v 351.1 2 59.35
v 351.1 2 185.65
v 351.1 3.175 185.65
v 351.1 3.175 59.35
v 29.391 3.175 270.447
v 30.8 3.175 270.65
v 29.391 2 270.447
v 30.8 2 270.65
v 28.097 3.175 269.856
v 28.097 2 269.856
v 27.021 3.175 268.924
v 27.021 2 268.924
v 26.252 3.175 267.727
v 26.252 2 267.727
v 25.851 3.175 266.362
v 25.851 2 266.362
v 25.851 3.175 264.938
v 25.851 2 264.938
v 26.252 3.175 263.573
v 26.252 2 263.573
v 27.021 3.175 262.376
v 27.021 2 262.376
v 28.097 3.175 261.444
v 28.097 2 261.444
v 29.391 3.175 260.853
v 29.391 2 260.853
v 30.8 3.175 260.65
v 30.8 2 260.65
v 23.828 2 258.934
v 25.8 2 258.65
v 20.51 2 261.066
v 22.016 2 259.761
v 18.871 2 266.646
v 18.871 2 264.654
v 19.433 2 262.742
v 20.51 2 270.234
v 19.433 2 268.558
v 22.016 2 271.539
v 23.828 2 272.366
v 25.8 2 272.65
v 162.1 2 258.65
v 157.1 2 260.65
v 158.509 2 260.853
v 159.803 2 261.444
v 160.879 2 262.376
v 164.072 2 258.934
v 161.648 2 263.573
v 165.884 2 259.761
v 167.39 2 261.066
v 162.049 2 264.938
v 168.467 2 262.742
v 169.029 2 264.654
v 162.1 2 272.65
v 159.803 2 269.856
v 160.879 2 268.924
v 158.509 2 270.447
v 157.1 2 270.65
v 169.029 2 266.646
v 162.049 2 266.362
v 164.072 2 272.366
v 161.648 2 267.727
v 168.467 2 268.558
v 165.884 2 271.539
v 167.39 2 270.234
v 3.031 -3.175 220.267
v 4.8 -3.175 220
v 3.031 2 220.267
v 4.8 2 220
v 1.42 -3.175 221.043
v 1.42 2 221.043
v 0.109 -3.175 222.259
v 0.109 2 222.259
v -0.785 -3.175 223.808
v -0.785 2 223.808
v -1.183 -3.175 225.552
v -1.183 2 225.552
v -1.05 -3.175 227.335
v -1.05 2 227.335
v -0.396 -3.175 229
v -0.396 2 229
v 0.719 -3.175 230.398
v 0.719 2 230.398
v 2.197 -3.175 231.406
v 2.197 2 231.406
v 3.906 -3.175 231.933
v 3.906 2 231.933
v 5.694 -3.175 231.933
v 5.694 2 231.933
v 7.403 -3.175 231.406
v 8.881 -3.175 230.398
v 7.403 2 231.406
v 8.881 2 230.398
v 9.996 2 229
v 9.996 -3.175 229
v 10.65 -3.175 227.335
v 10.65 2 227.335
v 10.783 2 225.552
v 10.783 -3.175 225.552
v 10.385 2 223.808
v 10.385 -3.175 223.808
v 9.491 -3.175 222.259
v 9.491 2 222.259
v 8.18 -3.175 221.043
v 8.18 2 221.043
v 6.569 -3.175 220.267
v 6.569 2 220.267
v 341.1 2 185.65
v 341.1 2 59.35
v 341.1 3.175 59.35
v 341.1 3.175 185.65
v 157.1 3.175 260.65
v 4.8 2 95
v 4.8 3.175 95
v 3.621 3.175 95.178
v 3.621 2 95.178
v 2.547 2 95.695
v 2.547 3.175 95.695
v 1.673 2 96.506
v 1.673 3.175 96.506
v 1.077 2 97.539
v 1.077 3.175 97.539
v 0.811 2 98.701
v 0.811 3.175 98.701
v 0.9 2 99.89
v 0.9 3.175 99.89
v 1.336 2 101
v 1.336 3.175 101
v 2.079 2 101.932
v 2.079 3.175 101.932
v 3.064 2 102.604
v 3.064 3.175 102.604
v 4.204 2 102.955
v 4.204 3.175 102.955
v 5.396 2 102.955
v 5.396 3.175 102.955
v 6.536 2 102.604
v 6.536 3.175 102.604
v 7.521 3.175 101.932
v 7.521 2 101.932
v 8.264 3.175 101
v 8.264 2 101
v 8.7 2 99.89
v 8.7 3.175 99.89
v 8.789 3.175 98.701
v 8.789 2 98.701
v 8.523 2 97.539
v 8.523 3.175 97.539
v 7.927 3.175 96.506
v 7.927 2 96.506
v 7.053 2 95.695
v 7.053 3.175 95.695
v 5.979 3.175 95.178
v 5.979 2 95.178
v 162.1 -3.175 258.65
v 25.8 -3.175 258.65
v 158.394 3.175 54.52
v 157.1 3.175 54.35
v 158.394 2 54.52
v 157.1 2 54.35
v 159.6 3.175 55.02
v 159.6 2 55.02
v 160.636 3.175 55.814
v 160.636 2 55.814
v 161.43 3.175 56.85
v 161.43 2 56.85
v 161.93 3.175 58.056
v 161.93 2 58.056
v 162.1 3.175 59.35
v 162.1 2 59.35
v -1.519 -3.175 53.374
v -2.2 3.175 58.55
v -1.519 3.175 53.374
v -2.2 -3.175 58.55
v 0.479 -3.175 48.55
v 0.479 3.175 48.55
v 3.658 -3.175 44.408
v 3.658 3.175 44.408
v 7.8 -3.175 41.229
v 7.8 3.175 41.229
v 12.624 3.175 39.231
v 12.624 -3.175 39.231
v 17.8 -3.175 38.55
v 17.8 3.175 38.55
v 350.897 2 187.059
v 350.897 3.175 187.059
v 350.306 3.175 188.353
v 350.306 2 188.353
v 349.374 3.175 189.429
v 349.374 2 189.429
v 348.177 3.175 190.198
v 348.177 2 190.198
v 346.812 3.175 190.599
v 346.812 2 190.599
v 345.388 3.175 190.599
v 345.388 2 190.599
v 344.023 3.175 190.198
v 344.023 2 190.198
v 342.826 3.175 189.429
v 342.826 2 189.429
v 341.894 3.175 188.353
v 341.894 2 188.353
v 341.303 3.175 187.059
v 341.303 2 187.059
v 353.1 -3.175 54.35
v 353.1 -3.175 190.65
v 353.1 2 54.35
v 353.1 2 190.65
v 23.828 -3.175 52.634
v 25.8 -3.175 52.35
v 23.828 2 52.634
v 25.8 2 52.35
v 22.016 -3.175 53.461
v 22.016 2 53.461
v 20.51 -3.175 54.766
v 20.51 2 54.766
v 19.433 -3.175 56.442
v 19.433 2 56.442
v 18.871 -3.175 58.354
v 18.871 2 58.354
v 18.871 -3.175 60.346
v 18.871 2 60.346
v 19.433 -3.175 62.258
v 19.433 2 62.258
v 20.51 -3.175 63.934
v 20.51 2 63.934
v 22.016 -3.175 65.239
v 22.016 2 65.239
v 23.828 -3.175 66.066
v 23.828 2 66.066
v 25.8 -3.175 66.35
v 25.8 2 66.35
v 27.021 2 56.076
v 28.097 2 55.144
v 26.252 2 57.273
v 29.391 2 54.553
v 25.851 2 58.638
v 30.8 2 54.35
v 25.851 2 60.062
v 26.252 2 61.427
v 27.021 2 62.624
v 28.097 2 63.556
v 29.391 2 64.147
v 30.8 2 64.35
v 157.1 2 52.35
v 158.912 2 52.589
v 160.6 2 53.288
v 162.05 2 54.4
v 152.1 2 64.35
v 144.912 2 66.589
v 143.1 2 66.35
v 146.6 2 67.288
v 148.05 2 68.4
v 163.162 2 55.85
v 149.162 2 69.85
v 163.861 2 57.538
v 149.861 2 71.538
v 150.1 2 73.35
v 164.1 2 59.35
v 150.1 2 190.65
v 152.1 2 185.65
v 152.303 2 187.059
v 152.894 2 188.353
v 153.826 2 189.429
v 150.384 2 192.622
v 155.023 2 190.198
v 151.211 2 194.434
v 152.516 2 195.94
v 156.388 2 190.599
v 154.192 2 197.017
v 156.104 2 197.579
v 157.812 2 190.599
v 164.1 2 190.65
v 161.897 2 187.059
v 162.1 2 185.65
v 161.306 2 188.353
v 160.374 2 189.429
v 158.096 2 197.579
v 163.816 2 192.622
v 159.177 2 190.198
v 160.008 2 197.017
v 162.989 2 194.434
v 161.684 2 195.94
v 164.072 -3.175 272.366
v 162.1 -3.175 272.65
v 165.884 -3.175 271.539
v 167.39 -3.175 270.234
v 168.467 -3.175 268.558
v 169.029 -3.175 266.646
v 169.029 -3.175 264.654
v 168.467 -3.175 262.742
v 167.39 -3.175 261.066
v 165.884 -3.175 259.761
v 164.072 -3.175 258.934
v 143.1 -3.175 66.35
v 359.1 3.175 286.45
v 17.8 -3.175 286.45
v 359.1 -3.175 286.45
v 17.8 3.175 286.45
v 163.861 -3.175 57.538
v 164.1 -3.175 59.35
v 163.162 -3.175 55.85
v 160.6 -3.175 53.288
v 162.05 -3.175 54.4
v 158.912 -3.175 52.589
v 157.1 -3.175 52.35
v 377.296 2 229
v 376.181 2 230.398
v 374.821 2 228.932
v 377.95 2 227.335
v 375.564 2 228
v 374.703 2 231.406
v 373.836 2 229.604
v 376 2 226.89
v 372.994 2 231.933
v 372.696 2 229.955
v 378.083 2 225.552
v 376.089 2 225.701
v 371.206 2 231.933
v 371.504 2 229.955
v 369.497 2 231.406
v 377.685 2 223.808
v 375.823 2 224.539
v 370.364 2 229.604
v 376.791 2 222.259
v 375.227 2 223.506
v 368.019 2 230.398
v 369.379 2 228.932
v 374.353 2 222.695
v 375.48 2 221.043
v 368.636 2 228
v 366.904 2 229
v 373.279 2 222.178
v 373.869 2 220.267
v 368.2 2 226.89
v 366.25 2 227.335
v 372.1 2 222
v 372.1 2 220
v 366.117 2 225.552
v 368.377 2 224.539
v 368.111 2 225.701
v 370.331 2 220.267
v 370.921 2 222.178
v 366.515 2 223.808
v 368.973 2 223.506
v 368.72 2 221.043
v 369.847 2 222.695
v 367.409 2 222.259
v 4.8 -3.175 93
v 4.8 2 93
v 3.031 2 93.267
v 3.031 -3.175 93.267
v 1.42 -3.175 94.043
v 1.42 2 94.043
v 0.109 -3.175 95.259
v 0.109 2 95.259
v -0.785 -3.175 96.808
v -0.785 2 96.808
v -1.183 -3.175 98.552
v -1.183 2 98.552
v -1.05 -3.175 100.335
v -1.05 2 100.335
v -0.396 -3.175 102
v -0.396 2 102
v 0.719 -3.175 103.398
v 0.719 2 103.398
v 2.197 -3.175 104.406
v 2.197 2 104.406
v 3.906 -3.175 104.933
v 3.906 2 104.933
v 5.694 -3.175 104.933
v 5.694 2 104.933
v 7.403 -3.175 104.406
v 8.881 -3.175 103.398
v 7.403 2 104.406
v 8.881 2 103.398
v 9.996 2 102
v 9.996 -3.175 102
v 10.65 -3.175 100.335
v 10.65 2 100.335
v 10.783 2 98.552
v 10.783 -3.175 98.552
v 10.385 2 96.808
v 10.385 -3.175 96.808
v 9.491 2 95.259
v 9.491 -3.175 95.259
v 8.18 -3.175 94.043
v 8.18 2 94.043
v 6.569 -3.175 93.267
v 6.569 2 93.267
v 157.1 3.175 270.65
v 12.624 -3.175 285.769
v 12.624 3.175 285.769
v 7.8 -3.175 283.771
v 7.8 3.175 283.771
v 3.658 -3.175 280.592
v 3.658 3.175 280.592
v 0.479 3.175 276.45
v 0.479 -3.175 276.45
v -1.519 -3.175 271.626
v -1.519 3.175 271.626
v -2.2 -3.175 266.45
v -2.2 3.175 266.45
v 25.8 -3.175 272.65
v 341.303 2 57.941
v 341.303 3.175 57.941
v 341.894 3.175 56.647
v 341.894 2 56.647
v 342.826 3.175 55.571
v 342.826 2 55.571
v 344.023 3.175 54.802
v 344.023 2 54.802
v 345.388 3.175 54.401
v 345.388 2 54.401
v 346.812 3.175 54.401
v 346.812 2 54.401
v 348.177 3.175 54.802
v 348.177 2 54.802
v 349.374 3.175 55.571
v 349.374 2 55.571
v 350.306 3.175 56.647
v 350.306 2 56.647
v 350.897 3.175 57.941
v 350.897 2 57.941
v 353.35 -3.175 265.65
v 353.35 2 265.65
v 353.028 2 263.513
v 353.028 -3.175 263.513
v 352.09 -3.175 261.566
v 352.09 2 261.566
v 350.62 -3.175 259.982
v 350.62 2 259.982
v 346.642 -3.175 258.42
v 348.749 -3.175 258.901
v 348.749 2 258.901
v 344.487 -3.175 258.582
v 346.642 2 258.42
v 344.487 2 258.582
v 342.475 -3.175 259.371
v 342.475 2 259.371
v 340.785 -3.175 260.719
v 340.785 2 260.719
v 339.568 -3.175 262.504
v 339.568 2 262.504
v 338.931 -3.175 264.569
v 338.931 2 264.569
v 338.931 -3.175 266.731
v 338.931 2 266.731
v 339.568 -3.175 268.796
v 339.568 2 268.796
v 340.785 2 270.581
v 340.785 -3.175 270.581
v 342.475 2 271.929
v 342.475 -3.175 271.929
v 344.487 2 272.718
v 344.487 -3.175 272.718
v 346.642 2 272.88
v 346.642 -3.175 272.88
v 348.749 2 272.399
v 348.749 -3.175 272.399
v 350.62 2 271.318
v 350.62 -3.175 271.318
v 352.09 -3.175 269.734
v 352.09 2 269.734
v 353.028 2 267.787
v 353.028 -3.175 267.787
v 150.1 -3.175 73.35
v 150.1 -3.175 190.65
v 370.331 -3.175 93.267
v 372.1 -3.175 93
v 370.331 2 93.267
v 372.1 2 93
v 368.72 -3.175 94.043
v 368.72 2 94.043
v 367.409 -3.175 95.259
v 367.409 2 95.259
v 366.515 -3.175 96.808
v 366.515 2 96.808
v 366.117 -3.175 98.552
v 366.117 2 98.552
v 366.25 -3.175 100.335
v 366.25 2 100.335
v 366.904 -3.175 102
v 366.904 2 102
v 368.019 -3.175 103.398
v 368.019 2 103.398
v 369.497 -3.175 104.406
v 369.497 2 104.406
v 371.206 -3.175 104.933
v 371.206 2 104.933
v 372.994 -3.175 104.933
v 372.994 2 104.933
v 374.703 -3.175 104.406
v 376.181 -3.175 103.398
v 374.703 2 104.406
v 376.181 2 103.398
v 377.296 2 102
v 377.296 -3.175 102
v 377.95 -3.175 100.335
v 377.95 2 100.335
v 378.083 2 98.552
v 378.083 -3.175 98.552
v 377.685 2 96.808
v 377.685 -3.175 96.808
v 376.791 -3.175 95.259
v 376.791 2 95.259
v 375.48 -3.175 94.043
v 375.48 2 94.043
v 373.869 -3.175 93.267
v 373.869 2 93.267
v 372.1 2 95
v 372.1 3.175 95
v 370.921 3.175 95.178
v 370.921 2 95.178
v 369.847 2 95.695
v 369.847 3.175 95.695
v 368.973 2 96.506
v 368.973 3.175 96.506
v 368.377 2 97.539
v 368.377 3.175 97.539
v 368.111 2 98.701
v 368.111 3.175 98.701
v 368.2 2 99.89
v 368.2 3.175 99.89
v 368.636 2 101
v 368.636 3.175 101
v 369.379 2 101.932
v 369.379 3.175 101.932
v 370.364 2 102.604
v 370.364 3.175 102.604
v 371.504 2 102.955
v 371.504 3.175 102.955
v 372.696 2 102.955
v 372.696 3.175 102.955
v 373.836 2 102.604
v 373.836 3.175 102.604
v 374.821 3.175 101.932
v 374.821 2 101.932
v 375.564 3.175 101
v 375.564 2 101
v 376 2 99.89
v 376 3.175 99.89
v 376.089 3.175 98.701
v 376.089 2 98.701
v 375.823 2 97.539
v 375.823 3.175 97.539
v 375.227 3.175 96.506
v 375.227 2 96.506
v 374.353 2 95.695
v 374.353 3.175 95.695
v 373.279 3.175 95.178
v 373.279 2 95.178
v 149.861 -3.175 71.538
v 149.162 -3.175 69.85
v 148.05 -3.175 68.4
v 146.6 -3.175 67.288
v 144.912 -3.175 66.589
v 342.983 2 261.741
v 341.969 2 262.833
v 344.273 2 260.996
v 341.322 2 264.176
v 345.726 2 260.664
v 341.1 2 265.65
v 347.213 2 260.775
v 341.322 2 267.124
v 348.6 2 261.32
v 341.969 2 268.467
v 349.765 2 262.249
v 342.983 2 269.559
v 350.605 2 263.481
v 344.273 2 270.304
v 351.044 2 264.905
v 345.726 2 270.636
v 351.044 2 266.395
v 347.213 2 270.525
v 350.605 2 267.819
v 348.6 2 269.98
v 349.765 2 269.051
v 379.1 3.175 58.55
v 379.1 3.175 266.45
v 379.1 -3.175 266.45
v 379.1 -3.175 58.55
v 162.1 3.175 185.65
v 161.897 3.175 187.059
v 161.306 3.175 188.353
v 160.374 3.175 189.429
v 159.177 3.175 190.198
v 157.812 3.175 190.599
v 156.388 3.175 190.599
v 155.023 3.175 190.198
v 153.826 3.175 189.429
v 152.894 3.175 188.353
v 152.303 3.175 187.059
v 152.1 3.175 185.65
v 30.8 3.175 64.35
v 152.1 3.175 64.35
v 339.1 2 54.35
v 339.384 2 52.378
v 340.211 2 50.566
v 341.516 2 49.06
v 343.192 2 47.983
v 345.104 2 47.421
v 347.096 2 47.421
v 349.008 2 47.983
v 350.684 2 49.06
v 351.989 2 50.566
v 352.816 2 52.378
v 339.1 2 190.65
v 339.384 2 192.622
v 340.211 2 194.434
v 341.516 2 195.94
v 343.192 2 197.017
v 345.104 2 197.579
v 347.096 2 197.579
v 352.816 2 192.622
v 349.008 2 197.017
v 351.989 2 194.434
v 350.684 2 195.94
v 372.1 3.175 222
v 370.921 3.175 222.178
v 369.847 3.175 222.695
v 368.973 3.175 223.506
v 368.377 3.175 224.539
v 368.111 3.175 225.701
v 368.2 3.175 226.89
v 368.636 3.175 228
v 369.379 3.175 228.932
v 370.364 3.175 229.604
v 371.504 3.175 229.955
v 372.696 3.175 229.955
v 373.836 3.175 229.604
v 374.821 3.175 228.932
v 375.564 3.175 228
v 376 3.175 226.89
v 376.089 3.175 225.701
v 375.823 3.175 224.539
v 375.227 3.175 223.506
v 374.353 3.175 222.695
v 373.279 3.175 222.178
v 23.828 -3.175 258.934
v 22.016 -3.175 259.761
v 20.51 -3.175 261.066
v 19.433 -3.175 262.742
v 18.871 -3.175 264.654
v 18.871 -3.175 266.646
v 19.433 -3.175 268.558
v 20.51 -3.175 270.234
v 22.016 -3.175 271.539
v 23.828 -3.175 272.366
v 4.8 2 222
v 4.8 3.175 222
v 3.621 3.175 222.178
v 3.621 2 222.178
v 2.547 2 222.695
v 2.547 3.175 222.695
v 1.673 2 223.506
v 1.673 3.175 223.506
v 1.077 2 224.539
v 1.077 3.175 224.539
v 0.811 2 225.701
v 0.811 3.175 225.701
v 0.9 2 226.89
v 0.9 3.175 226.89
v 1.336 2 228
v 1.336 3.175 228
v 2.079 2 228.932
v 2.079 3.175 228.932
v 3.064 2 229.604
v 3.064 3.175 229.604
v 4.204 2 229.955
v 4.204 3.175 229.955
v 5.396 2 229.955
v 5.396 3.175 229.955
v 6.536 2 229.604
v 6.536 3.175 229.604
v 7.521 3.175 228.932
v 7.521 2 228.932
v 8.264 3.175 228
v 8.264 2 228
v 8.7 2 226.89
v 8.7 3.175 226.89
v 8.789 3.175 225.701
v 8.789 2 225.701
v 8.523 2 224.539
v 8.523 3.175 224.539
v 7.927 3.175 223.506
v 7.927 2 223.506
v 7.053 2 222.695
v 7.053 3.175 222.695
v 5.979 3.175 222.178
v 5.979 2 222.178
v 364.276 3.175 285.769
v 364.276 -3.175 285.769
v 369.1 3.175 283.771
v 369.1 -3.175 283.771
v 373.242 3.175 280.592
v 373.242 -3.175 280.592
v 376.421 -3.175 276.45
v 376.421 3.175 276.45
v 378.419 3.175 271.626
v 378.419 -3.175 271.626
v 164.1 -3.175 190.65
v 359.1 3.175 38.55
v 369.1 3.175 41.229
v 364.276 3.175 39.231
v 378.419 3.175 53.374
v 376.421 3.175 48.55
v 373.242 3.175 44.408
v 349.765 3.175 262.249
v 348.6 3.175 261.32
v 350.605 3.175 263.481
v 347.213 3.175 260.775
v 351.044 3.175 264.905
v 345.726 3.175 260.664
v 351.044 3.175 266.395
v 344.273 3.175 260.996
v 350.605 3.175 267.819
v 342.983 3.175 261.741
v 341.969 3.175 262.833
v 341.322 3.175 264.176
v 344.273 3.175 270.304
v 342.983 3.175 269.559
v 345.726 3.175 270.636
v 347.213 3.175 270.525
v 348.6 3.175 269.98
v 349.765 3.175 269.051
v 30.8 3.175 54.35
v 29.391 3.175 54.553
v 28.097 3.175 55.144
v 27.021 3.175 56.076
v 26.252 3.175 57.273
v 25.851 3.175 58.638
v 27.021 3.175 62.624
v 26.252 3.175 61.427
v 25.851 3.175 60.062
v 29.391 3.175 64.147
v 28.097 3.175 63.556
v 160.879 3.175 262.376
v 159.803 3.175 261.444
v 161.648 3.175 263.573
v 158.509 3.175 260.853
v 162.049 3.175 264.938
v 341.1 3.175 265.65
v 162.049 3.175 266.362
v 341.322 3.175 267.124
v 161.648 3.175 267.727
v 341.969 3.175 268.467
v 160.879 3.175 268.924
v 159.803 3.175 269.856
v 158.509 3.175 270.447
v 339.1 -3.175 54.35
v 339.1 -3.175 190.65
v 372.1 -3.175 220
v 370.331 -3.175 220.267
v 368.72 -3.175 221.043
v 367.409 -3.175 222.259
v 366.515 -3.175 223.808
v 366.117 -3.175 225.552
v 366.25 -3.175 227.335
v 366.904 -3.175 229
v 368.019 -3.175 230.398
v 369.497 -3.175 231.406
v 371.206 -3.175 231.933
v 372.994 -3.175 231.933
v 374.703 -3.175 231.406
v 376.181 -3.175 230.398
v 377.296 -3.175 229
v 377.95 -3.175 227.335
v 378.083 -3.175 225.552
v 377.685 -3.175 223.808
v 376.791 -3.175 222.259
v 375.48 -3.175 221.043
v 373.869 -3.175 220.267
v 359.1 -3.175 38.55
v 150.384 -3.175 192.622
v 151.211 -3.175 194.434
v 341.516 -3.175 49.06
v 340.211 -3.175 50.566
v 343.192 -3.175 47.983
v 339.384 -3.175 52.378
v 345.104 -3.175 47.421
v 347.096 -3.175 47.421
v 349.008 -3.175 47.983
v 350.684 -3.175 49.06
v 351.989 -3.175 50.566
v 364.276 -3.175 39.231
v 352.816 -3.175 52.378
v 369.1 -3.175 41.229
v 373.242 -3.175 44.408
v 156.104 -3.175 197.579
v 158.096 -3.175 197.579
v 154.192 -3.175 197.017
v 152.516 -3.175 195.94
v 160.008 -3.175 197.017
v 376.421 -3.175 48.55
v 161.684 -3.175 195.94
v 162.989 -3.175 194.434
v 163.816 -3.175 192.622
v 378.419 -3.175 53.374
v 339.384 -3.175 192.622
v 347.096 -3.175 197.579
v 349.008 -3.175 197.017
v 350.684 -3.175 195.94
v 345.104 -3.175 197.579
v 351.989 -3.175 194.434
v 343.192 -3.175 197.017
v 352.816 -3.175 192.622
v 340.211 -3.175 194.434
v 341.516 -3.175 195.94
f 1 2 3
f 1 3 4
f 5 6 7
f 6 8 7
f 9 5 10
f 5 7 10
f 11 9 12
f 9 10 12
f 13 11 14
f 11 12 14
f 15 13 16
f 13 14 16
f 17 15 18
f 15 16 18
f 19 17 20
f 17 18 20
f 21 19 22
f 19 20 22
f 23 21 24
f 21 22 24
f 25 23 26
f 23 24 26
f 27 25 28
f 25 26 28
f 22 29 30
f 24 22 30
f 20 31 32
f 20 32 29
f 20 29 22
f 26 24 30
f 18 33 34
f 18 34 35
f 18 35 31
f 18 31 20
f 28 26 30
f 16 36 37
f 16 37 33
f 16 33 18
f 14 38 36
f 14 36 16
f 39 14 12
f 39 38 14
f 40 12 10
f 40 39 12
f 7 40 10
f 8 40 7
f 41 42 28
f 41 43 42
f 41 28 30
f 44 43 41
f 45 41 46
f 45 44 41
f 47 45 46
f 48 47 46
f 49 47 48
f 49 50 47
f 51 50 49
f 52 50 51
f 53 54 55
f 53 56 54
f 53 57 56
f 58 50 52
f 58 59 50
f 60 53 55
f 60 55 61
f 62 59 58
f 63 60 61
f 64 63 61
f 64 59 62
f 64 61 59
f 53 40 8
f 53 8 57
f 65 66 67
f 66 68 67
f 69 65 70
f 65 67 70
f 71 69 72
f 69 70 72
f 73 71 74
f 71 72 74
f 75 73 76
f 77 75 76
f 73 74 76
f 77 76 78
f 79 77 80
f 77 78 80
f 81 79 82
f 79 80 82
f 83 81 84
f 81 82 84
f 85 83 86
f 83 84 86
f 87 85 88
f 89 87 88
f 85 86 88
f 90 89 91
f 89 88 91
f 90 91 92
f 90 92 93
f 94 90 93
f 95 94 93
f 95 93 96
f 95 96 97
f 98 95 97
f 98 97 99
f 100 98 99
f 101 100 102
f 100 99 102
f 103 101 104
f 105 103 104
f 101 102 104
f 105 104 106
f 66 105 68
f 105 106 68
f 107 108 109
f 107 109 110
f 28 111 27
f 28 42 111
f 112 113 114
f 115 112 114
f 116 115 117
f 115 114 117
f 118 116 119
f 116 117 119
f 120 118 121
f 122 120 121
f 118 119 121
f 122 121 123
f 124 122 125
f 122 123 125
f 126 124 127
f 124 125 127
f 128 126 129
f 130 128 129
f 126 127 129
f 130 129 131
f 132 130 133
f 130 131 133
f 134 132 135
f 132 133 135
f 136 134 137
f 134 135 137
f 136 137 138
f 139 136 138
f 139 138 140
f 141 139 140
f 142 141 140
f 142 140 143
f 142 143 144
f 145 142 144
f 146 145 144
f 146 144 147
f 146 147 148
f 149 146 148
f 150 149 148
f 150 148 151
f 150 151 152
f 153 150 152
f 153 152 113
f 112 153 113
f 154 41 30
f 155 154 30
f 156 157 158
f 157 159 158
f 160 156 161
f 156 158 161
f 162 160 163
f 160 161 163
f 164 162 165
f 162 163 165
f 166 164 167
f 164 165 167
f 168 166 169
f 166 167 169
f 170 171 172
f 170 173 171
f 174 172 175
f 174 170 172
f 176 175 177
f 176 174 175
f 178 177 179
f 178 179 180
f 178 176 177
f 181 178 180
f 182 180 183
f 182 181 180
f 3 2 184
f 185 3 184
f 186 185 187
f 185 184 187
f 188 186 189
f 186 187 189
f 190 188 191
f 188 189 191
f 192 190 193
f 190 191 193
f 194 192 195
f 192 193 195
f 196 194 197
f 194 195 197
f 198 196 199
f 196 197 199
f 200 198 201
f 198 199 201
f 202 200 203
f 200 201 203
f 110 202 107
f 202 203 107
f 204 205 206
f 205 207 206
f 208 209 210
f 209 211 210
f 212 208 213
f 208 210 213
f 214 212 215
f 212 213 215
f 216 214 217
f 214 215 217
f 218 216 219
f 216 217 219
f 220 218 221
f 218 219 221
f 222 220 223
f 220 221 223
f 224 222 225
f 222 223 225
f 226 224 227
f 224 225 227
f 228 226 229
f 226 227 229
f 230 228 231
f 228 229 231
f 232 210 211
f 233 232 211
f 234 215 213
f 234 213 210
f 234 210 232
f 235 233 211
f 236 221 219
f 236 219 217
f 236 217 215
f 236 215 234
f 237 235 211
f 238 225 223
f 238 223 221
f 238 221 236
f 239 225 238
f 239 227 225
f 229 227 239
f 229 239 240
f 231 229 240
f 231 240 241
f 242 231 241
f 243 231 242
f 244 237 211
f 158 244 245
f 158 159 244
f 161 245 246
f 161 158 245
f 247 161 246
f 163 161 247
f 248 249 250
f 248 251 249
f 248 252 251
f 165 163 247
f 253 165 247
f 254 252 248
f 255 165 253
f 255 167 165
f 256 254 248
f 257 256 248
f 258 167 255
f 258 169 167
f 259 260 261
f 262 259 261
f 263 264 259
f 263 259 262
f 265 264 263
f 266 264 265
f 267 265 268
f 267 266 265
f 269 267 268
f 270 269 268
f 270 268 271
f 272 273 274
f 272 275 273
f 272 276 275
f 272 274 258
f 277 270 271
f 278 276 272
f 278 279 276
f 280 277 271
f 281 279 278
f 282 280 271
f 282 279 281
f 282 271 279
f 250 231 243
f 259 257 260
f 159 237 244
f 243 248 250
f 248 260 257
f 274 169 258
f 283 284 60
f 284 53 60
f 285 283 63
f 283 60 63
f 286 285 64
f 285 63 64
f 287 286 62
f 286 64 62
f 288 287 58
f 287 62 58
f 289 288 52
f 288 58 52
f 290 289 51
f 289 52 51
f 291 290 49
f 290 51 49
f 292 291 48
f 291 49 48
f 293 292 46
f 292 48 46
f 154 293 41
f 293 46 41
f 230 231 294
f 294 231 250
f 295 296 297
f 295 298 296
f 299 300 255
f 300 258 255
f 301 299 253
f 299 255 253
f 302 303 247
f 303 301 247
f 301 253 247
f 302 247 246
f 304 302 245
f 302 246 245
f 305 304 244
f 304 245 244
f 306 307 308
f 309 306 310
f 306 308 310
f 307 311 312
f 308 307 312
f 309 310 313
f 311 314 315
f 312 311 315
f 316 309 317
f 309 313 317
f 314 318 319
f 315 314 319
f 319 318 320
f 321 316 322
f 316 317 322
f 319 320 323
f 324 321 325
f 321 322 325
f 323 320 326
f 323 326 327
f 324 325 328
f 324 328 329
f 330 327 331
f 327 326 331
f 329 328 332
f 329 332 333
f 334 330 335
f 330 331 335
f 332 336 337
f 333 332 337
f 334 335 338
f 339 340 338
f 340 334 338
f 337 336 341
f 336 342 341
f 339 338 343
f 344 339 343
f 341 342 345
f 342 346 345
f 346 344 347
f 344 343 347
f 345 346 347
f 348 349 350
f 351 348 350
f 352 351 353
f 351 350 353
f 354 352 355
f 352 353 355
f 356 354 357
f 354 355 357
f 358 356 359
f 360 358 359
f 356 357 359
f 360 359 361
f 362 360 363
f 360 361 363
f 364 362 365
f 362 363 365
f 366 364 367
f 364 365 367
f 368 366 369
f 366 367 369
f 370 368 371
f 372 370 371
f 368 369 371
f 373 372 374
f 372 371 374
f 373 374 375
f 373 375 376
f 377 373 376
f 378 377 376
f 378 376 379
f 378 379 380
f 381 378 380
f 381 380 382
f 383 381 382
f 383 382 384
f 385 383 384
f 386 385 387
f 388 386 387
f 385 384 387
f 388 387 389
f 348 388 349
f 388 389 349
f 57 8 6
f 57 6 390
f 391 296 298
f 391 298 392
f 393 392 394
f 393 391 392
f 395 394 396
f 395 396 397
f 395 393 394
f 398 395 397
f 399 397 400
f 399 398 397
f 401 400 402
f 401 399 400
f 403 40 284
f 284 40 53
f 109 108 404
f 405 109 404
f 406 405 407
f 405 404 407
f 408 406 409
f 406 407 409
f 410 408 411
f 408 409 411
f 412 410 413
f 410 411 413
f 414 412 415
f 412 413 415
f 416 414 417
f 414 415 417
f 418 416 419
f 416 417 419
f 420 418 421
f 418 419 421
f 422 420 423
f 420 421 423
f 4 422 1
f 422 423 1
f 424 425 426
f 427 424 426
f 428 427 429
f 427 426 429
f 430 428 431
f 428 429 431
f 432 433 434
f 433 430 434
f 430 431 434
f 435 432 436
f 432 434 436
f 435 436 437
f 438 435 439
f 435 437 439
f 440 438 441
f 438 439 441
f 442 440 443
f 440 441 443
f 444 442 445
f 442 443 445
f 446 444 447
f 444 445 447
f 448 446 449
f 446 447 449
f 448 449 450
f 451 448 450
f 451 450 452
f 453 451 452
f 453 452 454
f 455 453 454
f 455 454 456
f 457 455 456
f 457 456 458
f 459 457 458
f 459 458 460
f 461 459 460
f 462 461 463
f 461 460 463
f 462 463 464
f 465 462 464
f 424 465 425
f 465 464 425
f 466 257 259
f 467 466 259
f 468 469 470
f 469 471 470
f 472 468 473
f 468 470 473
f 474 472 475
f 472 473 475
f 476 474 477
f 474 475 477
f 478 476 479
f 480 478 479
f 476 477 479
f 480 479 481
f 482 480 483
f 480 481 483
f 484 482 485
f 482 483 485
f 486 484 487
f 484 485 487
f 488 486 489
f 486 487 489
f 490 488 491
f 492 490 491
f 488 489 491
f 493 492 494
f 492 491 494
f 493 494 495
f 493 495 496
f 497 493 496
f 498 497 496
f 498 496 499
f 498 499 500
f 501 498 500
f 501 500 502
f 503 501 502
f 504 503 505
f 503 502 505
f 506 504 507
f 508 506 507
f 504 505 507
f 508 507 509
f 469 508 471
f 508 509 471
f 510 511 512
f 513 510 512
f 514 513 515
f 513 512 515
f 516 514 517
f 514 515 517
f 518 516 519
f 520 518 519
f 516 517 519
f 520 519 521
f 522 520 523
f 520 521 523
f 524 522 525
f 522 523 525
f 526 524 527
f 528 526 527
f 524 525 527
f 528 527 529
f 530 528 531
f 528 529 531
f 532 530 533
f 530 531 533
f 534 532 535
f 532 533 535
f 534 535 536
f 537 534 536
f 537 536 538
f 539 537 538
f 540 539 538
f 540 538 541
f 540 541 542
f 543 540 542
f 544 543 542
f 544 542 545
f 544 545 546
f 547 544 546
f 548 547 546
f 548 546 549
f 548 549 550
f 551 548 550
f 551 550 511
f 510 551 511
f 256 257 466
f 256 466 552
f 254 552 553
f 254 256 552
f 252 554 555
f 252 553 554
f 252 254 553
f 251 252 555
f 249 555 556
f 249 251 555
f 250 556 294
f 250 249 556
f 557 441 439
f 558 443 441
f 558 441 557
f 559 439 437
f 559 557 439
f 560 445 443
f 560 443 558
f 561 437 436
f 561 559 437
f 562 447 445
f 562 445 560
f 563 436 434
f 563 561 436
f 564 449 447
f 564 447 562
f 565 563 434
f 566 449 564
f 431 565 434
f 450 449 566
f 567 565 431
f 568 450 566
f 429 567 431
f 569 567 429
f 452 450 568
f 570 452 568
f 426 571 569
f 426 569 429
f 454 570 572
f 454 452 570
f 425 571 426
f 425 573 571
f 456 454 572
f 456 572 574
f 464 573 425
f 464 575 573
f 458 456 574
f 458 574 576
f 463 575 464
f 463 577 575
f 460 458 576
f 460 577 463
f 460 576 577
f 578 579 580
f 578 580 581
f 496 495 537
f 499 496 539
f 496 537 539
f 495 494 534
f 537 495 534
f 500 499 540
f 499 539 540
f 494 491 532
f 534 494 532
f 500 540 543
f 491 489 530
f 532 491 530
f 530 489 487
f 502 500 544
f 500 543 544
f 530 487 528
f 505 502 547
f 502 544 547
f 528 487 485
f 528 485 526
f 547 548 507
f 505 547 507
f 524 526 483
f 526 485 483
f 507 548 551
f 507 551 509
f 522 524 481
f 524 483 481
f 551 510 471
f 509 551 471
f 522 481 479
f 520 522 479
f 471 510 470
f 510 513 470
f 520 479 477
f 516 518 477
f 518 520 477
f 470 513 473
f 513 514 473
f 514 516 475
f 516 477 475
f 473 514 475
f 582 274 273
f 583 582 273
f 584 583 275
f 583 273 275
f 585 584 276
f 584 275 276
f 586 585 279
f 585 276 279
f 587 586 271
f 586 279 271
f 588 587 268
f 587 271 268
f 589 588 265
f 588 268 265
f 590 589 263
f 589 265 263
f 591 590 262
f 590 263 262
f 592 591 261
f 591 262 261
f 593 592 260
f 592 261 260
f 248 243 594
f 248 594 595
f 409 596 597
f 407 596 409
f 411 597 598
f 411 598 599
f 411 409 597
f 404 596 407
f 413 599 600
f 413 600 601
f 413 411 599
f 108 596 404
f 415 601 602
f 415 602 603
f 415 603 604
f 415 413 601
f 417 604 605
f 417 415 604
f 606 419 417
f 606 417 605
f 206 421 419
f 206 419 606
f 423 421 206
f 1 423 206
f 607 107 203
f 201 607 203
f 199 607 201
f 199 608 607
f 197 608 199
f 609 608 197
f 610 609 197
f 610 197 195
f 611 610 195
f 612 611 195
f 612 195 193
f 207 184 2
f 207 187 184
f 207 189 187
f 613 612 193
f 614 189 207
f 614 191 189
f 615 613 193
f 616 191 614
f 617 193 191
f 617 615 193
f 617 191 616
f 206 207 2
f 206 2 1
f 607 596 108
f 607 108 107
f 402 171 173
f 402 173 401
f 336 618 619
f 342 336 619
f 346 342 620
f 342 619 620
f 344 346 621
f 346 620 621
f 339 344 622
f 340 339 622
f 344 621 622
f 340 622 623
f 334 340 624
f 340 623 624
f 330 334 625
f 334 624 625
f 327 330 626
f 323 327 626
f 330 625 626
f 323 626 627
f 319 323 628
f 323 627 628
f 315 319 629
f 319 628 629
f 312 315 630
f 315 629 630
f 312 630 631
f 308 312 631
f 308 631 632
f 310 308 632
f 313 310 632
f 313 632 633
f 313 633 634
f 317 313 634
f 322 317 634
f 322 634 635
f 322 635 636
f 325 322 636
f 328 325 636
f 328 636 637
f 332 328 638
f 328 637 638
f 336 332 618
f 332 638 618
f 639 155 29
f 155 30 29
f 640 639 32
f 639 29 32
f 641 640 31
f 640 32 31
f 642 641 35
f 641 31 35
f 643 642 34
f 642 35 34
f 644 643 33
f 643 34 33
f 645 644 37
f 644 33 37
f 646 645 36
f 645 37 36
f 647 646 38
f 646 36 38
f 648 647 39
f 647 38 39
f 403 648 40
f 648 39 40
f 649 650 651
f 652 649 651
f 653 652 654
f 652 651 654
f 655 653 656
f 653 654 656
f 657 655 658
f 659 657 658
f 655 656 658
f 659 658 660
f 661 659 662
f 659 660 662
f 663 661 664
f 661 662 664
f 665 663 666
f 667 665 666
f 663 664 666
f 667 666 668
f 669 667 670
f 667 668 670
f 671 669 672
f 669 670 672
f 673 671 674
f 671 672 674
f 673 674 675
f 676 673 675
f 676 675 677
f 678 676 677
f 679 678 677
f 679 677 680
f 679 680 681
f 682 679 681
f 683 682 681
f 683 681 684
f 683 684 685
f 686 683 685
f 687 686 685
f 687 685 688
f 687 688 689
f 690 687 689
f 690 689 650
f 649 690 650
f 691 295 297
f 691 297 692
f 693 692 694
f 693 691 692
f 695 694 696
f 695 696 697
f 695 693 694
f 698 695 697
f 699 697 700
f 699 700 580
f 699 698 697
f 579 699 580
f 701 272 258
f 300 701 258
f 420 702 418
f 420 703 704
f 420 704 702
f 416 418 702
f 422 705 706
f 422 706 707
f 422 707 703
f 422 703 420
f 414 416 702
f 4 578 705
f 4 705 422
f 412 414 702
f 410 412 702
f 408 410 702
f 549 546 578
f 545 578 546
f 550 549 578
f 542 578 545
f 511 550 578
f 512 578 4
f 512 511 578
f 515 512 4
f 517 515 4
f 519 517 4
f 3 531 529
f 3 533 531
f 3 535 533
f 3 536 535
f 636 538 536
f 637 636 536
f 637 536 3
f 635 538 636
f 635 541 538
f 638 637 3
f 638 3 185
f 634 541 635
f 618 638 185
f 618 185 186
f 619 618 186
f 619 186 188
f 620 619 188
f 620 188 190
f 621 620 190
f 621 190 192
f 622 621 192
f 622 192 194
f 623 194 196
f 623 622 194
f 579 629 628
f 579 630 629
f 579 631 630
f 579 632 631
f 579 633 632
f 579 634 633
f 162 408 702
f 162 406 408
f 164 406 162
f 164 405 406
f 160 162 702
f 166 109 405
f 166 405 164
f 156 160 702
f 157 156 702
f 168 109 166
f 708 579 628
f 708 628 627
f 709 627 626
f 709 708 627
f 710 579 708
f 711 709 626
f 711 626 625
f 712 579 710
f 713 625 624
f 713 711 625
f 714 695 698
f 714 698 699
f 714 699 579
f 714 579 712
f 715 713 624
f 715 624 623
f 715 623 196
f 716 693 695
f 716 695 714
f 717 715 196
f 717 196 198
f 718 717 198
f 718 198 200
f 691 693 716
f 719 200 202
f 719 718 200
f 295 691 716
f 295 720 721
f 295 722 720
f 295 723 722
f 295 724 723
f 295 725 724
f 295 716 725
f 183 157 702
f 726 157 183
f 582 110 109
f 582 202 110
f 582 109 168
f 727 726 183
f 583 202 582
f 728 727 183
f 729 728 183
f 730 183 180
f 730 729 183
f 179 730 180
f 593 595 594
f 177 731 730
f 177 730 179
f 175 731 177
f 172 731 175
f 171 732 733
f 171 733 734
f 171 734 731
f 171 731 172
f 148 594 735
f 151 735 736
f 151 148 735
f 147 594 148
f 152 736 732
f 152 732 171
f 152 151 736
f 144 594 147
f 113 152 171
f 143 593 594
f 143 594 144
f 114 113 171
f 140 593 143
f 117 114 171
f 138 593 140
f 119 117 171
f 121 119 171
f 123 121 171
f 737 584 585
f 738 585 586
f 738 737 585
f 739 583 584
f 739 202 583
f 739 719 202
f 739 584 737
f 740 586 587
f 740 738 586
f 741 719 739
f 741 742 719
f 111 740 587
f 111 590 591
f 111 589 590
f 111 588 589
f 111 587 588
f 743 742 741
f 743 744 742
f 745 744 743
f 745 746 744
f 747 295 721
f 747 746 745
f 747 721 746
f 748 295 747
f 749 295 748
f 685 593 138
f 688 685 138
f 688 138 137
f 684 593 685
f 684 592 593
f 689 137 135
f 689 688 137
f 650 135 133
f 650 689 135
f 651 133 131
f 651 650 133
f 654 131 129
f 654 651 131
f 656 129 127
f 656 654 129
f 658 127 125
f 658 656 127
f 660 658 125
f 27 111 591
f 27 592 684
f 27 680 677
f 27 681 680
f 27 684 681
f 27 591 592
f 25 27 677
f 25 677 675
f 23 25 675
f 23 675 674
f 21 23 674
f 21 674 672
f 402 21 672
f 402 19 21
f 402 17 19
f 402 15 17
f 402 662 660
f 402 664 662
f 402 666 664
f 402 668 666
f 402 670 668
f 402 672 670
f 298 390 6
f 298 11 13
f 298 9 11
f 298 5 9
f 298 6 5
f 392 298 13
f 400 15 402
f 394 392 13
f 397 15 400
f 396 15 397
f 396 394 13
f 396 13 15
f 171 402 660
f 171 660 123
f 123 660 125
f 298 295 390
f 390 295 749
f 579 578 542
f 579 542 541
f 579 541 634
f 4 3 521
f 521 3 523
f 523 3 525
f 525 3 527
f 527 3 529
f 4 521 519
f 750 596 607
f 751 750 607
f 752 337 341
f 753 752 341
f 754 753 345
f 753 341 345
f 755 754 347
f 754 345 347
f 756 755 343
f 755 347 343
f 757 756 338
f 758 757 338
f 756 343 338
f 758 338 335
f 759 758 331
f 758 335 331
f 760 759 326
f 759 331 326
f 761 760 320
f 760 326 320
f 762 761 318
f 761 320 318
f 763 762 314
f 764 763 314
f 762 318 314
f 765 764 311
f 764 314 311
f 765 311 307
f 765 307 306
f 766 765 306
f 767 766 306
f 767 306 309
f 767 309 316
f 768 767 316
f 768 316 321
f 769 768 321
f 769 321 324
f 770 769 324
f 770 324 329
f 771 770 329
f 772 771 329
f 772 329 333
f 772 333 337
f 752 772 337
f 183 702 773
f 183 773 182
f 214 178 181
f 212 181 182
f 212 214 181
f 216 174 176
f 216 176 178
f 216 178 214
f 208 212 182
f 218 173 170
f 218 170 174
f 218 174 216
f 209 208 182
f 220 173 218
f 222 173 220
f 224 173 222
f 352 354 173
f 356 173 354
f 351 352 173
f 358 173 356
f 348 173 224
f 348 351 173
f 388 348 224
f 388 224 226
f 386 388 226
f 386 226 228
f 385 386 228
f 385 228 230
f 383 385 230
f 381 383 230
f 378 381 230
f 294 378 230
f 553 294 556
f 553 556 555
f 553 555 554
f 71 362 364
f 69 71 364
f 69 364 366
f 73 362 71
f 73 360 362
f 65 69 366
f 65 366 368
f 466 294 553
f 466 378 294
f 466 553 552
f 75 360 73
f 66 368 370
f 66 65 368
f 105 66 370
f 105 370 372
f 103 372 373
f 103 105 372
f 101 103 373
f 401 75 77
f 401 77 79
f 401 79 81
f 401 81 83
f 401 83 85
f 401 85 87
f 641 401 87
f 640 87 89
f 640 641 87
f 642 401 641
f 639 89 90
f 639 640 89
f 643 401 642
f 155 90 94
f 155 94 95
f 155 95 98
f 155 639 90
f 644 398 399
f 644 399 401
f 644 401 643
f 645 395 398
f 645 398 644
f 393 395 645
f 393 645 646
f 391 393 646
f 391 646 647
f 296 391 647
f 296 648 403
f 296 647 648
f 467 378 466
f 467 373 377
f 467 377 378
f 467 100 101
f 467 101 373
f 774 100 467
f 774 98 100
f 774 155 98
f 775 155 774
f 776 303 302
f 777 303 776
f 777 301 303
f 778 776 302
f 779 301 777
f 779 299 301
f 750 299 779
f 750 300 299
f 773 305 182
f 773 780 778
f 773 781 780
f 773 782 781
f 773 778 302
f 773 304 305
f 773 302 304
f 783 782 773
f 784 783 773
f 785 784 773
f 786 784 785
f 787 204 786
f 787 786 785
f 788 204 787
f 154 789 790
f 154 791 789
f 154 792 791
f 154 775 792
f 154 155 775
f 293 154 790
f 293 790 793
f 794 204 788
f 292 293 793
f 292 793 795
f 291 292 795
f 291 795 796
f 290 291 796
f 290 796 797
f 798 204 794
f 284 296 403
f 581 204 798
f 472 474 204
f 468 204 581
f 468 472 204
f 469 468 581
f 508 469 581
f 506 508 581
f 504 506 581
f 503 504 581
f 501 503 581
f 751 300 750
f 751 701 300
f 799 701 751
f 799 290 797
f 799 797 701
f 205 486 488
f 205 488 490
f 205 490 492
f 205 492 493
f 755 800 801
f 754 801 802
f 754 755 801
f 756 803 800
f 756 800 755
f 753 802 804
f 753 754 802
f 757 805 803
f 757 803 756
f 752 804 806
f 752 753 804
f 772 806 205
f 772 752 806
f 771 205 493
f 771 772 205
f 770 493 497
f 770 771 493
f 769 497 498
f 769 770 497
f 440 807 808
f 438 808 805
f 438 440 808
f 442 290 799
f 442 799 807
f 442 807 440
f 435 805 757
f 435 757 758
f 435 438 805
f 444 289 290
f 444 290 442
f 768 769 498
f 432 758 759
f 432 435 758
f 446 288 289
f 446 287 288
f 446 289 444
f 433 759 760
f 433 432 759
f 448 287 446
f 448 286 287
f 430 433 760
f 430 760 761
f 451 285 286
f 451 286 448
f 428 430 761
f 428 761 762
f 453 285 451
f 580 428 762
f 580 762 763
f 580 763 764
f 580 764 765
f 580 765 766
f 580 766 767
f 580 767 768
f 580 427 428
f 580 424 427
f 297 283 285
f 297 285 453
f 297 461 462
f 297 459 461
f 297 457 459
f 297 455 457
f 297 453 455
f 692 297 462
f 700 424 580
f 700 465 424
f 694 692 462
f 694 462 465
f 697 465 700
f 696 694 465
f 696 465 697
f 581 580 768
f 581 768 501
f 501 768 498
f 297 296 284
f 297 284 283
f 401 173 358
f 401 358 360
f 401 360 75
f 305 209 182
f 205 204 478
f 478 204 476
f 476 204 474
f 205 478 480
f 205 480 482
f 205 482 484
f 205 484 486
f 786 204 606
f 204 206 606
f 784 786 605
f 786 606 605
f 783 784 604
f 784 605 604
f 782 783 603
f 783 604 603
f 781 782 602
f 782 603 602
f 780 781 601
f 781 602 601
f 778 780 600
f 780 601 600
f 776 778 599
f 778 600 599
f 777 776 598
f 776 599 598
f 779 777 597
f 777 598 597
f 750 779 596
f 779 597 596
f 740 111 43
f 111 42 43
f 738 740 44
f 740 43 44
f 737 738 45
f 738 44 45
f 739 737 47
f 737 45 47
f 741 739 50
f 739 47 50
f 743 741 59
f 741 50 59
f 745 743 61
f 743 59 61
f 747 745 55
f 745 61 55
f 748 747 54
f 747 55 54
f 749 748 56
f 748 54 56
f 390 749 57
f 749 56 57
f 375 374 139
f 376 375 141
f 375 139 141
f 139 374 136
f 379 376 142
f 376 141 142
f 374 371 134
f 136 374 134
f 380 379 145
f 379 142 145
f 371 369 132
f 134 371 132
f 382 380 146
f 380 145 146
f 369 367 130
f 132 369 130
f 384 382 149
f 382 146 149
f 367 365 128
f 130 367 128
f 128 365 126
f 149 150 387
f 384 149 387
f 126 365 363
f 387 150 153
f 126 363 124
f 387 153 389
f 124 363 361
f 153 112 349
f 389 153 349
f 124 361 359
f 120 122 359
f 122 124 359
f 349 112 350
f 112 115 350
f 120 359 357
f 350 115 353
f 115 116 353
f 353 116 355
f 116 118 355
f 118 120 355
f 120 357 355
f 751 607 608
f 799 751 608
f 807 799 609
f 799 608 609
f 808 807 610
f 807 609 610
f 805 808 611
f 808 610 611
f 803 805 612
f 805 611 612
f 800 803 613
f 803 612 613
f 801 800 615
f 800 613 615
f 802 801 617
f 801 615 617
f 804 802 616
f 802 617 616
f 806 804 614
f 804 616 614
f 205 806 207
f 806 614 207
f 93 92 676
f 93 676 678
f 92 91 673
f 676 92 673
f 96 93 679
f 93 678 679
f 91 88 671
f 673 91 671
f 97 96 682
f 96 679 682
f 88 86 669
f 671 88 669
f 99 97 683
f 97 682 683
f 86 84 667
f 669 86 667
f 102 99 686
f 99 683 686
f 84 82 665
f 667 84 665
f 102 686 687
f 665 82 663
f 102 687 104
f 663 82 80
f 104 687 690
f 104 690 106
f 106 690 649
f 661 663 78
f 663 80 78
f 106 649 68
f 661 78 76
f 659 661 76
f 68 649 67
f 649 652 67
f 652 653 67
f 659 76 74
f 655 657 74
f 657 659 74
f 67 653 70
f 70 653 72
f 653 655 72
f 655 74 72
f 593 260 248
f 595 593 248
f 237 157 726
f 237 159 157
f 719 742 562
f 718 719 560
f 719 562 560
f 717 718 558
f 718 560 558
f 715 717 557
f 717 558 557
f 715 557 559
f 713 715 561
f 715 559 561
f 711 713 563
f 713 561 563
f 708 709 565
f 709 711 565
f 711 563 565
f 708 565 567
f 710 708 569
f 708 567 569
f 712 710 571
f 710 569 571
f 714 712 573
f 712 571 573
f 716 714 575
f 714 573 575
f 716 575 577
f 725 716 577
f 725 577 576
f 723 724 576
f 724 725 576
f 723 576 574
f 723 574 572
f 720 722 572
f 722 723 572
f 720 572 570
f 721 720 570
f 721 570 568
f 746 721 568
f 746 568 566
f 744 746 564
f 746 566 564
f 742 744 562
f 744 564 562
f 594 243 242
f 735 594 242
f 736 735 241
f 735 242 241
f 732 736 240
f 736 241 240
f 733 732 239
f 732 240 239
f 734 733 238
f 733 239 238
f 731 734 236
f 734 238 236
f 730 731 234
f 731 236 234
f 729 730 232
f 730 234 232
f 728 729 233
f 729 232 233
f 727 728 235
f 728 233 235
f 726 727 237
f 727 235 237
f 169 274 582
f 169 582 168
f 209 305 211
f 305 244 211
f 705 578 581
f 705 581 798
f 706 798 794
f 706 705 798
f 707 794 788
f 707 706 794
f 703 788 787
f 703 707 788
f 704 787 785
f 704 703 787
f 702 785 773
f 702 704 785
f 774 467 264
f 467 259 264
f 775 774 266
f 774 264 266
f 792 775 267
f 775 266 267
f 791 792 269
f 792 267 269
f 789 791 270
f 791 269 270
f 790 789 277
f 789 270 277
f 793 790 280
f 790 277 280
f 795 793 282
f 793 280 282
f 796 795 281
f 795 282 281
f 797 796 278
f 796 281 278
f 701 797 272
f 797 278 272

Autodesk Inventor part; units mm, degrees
ref_plane "YZ Plane" through (0, 0, 0) normal (1, 0, 0) x (0, 1, 0)
ref_plane "XZ Plane" through (0, 0, 0) normal (0, 1, 0) x (-1, 0, 0)
sketch "Sketch1" plane through (0, 0, 0) normal (0, 1, 0) x (-1, 0, 0)
  line L0 (-301.6, 175.65) -> (-203.3004, 175.65)
  line L1 (-203.3004, 275.65) -> (-301.6, 275.65)
  line L2 (-301.6, 275.65) -> (-301.6, 175.65)
  line L3 (-301.6, 275.65) -> (-201.6, 275.65)
  line L4 (-201.6, 275.65) -> (-201.6, 175.65)
  line L5 (-201.6, 175.65) -> (-301.6, 175.65)
  line L6 (-301.6, 175.65) -> (-301.6, 275.65)
  line L7 (-301.6, 175.65) -> (-301.6, 275.65)
  line L8 (-301.6, 275.65) -> (-201.6, 275.65)
  line L9 (-201.6, 275.65) -> (-201.6, 75.65)
  line L10 (-301.6, 75.65) -> (-301.6, 275.65)
  line L11 (-301.6, 75.65) -> (-301.6, 275.65)
  line L12 (-152.1, 75.65) -> (-162.1, 75.65)
  line L13 (-157.1, 260.65) -> (-57.1, 260.65)
  line L14 (-52.1, 265.65) -> (-52.1, 265.65)
  line L15 (-57.1, 270.65) -> (-157.1, 270.65)
  circle A0 centre (-346.1, 265.65) radius 5
  arc A1 (-157.1, 270.65) -> (-157.1, 260.65) centre (-157.1, 265.65) ccw
  line L16 (-201.6, 75.65) -> (-157.1, 75.65)
  arc A2 (-152.1, 185.65) -> (-162.1, 185.65) centre (-157.1, 185.65) ccw
  line L17 (-162.1, 185.65) -> (-162.1, 85.65)
  line L18 (-152.1, 75.65) -> (-152.1, 185.65)
  line L19 (-157.1, 80.65) -> (-157.1, 80.65)
  arc A3 (-341.1, 185.65) -> (-351.1, 185.65) centre (-346.1, 185.65) ccw
  line L20 (-341.1, 85.65) -> (-341.1, 185.65)
  line L21 (-351.1, 185.65) -> (-351.1, 85.65)
  line L22 (-346.1, 80.65) -> (-346.1, 80.65)
  line L23 (-301.6, 275.65) -> (-201.6, 275.65)
  line L24 (-201.6, 275.65) -> (-201.6, 49.35)
  line L25 (-201.6, 49.35) -> (-301.6, 49.35)
  line L26 (-301.6, 49.35) -> (-301.6, 275.65)
  line L27 (-351.1, 85.65) -> (-351.1, 59.35)
  line L28 (-341.1, 59.35) -> (-341.1, 85.65)
  arc A4 (-351.1, 59.35) -> (-341.1, 59.35) centre (-346.1, 59.35) ccw
  line L29 (-152.1, 80.65) -> (-152.1, 64.35)
  line L30 (-162.1, 59.35) -> (-162.1, 85.65)
  arc A5 (-162.1, 59.35) -> (-157.1, 54.35) centre (-157.1, 59.35) ccw
  line L31 (-301.6, 49.35) -> (-75.3, 49.35)
  line L32 (-75.3, 49.35) -> (-75.3, 275.65)
  line L33 (-75.3, 275.65) -> (-201.6, 275.65)
  line L34 (-157.1, 54.35) -> (-30.8, 54.35)
  arc A6 (-30.8, 54.35) -> (-30.8, 64.35) centre (-30.8, 59.35) ccw
  line L35 (-30.8, 64.35) -> (-152.1, 64.35)
  line L36 (-57.1, 260.65) -> (-30.8, 260.65)
  line L37 (-57.1, 270.65) -> (-30.8, 270.65)
  arc A7 (-30.8, 260.65) -> (-30.8, 270.65) centre (-30.8, 265.65) ccw
  line L38 (-69.2464, 270.65) -> (-69.2464, 286.45)
  line L39 (2.2, 286.45) -> (-379.1, 286.45)
  line L40 (-52.1, 54.35) -> (-52.1, 38.55)
  line L41 (2.2, 38.55) -> (-379.1, 38.55)
  line L42 (-25.8, 59.35) -> (-4.8, 59.35)
  line L43 (2.2, 38.55) -> (2.2, 286.45)
  line L44 (-4.8, 99) -> (-4.8, 226)
  line L45 (-372.1, 99) -> (-372.1, 226)
  line L46 (-379.1, 38.55) -> (-379.1, 286.45)
  point P0 (-52.1, 270.65)
  point P1 (-52.1, 260.65)
  point P2 (-157.1, 85.65)
  point P3 (-157.1, 185.65)
  point P4 (-157.1, 85.65)
  point P5 (-162.1, 80.65)
  point P6 (0, 305)
  point P7 (-152.1, 75.65)
  dimension "d2" = 100
  dimension "d3" = 100
  dimension "d7" = 10
  dimension "d8" = 10
  dimension "d16" = 10
  dimension "d17" = 44.5
  dimension "d20" = 10
  dimension "d21" = 10
  dimension "d22" = 10
  dimension "d70" = 226.3
  dimension "d72" = 10
  dimension "d73" = 10
  dimension "d180" = 226.3
  dimension "d224" = 15.8
  dimension "d227" = 15.8
  dimension "d229" = 21
  dimension "d233" = 127
  dimension "d235" = 127
extrude "Extrusion1" add sketch "Sketch1" along normal blind 3.175 contours L2 L1 L3 L4 L5 L0 | L10 L26 L25 L31 L32 L34 L40 L41 L46 L39 L38 L15 L33 L3 L1 L2 | L0 L5 L9 L24 L25 L26 L10 | L4 L33 L32 L15 A1 L13 L35 L29 L18 A2 L17 L30 L16 L9 | L16 L30 A5 L34 L32 L31 L24 | L38 L39 L43 L41 L40 L34 A6 L35 L32 L13 L36 A7 L37 L15
sketch "Sketch2" plane through (0, 0, 0) normal (0, -1, 0) x (1, 0, 0)
  line L0 (346.1, 80.65) -> (346.1, 80.65)
  line L1 (353.1, 85.65) -> (353.1, 190.65)
  line L2 (339.1, 190.65) -> (339.1, 85.65)
  line L3 (339.1, 85.65) -> (339.1, 54.35)
  line L4 (353.1, 54.35) -> (353.1, 85.65)
  circle A0 centre (346.1, 265.65) radius 7.25
  line L5 (57.1, 258.65) -> (162.1, 258.65)
  line L6 (162.1, 272.65) -> (57.1, 272.65)
  line L7 (57.1, 272.65) -> (25.8, 272.65)
  line L8 (25.8, 258.65) -> (57.1, 258.65)
  line L9 (25.8, 59.35) -> (25.8, 59.35)
  line L10 (157.1, 190.65) -> (157.1, 190.65)
  line L11 (152.1, 185.65) -> (152.1, 64.35) projected
  line L12 (25.8, 52.35) -> (157.1, 52.35)
  arc A1 (157.1, 52.35) -> (164.1, 59.35) centre (157.1, 59.35) ccw
  line L13 (164.1, 59.35) -> (164.1, 190.65)
  line L14 (150.1, 190.65) -> (150.1, 73.35)
  line L15 (143.1, 66.35) -> (25.8, 66.35)
  arc A2 (143.1, 66.35) -> (150.1, 73.35) centre (143.1, 73.35) ccw
  line L16 (346.1, 185.65) -> (346.1, 190.65)
  arc A3 (353.1, 190.65) -> (339.1, 190.65) centre (346.1, 190.65) ccw
  arc A4 (339.1, 54.35) -> (353.1, 54.35) centre (346.1, 54.35) ccw
  arc A5 (164.1, 190.65) -> (150.1, 190.65) centre (157.1, 190.65) ccw
  arc A6 (25.8, 66.35) -> (25.8, 52.35) centre (25.8, 59.35) ccw
  arc A7 (30.8, 270.65) -> (30.8, 260.65) centre (30.8, 265.65) ccw projected
  arc A8 (25.8, 272.65) -> (25.8, 258.65) centre (25.8, 265.65) ccw
  arc A9 (162.1, 258.65) -> (162.1, 272.65) centre (162.1, 265.65) ccw
  point P0 (0, 305)
  point P1 (52.1, 260.65)
  dimension "d209" = 7
  dimension "d212" = 5
  dimension "d213" = 14
  dimension "d215" = 14
  dimension "d217" = 14
  dimension "d219" = 14
  dimension "d221" = 14
  dimension "d223" = 14
extrude "Extrusion2" cut sketch "Sketch2" against normal blind 2
sketch "Sketch4" plane through (0, 0, 0) normal (0, -1, 0) x (1, 0, 0)
  line L0 (339.1, 54.35) -> (339.1, 190.65) projected
  line L1 (353.1, 190.65) -> (353.1, 54.35) projected
  line L2 (150.1, 73.35) -> (150.1, 190.65) projected
  line L3 (164.1, 190.65) -> (164.1, 59.35) projected
  arc A0 (157.1, 52.35) -> (164.1, 59.35) centre (157.1, 59.35) ccw projected
  line L4 (157.1, 52.35) -> (25.8, 52.35) projected
  arc A1 (143.1, 66.35) -> (150.1, 73.35) centre (143.1, 73.35) ccw projected
  line L5 (25.8, 66.35) -> (143.1, 66.35) projected
  circle A2 centre (346.1, 265.65) radius 7.25 projected
  line L6 (162.1, 258.65) -> (25.8, 258.65) projected
  line L7 (25.8, 272.65) -> (162.1, 272.65) projected
  arc A3 (339.1, 54.35) -> (353.1, 54.35) centre (346.1, 54.35) ccw projected
  arc A4 (353.1, 190.65) -> (339.1, 190.65) centre (346.1, 190.65) ccw projected
  arc A5 (164.1, 190.65) -> (150.1, 190.65) centre (157.1, 190.65) ccw projected
  arc A6 (25.8, 66.35) -> (25.8, 52.35) centre (25.8, 59.35) ccw projected
  arc A7 (162.1, 258.65) -> (162.1, 272.65) centre (162.1, 265.65) ccw projected
  arc A8 (25.8, 272.65) -> (25.8, 258.65) centre (25.8, 265.65) ccw projected
  line L8 (-2.2, 286.45) -> (379.1, 286.45) projected
  line L9 (379.1, 38.55) -> (-2.2, 38.55) projected
  line L10 (-2.2, 38.55) -> (-2.2, 286.45) projected
  line L11 (379.1, 286.45) -> (379.1, 38.55) projected
  point P0 (353.1, 59.35)
  point P1 (339.1, 59.35)
  point P2 (339.1, 185.65)
  point P3 (353.1, 185.65)
  point P4 (150.1, 185.65)
  point P5 (164.1, 185.65)
  point P6 (30.8, 52.35)
  point P7 (30.8, 66.35)
  point P8 (157.1, 258.65)
  point P9 (30.8, 258.65)
  point P10 (157.1, 272.65)
  point P11 (30.8, 272.65)
extrude "Extrusion4" add sketch "Sketch4" along normal blind 3.175
fillet "Fillet2" radius 20 4 edges at (-2.2, 0, 286.45) (379.1, 0, 286.45) (379.1, 0, 38.55) (-2.2, 0, 38.55)
ref_plane "Work Plane2" through (0, -3.175, 0) normal (0, -1, 0) x (1, 0, 0)
sketch "Sketch6" plane through (0, -3.175, 0) normal (0, -1, 0) x (1, 0, 0)
  line L0 (4.8, 99) -> (4.8, 226) projected
  line L1 (372.1, 99) -> (372.1, 226) projected
  point P0 (0, 0)
hole "Hole1" at (4.8, -3.175, 226) at (4.8, -3.175, 99) at (372.1, -3.175, 226) at (372.1, -3.175, 99) direction (0, 1, 0) diameter 8 end through all counterbore diameter 12 counterbore depth 5.175
properties part number "PlateAxial" material "Aluminum, Anodized Silver"
